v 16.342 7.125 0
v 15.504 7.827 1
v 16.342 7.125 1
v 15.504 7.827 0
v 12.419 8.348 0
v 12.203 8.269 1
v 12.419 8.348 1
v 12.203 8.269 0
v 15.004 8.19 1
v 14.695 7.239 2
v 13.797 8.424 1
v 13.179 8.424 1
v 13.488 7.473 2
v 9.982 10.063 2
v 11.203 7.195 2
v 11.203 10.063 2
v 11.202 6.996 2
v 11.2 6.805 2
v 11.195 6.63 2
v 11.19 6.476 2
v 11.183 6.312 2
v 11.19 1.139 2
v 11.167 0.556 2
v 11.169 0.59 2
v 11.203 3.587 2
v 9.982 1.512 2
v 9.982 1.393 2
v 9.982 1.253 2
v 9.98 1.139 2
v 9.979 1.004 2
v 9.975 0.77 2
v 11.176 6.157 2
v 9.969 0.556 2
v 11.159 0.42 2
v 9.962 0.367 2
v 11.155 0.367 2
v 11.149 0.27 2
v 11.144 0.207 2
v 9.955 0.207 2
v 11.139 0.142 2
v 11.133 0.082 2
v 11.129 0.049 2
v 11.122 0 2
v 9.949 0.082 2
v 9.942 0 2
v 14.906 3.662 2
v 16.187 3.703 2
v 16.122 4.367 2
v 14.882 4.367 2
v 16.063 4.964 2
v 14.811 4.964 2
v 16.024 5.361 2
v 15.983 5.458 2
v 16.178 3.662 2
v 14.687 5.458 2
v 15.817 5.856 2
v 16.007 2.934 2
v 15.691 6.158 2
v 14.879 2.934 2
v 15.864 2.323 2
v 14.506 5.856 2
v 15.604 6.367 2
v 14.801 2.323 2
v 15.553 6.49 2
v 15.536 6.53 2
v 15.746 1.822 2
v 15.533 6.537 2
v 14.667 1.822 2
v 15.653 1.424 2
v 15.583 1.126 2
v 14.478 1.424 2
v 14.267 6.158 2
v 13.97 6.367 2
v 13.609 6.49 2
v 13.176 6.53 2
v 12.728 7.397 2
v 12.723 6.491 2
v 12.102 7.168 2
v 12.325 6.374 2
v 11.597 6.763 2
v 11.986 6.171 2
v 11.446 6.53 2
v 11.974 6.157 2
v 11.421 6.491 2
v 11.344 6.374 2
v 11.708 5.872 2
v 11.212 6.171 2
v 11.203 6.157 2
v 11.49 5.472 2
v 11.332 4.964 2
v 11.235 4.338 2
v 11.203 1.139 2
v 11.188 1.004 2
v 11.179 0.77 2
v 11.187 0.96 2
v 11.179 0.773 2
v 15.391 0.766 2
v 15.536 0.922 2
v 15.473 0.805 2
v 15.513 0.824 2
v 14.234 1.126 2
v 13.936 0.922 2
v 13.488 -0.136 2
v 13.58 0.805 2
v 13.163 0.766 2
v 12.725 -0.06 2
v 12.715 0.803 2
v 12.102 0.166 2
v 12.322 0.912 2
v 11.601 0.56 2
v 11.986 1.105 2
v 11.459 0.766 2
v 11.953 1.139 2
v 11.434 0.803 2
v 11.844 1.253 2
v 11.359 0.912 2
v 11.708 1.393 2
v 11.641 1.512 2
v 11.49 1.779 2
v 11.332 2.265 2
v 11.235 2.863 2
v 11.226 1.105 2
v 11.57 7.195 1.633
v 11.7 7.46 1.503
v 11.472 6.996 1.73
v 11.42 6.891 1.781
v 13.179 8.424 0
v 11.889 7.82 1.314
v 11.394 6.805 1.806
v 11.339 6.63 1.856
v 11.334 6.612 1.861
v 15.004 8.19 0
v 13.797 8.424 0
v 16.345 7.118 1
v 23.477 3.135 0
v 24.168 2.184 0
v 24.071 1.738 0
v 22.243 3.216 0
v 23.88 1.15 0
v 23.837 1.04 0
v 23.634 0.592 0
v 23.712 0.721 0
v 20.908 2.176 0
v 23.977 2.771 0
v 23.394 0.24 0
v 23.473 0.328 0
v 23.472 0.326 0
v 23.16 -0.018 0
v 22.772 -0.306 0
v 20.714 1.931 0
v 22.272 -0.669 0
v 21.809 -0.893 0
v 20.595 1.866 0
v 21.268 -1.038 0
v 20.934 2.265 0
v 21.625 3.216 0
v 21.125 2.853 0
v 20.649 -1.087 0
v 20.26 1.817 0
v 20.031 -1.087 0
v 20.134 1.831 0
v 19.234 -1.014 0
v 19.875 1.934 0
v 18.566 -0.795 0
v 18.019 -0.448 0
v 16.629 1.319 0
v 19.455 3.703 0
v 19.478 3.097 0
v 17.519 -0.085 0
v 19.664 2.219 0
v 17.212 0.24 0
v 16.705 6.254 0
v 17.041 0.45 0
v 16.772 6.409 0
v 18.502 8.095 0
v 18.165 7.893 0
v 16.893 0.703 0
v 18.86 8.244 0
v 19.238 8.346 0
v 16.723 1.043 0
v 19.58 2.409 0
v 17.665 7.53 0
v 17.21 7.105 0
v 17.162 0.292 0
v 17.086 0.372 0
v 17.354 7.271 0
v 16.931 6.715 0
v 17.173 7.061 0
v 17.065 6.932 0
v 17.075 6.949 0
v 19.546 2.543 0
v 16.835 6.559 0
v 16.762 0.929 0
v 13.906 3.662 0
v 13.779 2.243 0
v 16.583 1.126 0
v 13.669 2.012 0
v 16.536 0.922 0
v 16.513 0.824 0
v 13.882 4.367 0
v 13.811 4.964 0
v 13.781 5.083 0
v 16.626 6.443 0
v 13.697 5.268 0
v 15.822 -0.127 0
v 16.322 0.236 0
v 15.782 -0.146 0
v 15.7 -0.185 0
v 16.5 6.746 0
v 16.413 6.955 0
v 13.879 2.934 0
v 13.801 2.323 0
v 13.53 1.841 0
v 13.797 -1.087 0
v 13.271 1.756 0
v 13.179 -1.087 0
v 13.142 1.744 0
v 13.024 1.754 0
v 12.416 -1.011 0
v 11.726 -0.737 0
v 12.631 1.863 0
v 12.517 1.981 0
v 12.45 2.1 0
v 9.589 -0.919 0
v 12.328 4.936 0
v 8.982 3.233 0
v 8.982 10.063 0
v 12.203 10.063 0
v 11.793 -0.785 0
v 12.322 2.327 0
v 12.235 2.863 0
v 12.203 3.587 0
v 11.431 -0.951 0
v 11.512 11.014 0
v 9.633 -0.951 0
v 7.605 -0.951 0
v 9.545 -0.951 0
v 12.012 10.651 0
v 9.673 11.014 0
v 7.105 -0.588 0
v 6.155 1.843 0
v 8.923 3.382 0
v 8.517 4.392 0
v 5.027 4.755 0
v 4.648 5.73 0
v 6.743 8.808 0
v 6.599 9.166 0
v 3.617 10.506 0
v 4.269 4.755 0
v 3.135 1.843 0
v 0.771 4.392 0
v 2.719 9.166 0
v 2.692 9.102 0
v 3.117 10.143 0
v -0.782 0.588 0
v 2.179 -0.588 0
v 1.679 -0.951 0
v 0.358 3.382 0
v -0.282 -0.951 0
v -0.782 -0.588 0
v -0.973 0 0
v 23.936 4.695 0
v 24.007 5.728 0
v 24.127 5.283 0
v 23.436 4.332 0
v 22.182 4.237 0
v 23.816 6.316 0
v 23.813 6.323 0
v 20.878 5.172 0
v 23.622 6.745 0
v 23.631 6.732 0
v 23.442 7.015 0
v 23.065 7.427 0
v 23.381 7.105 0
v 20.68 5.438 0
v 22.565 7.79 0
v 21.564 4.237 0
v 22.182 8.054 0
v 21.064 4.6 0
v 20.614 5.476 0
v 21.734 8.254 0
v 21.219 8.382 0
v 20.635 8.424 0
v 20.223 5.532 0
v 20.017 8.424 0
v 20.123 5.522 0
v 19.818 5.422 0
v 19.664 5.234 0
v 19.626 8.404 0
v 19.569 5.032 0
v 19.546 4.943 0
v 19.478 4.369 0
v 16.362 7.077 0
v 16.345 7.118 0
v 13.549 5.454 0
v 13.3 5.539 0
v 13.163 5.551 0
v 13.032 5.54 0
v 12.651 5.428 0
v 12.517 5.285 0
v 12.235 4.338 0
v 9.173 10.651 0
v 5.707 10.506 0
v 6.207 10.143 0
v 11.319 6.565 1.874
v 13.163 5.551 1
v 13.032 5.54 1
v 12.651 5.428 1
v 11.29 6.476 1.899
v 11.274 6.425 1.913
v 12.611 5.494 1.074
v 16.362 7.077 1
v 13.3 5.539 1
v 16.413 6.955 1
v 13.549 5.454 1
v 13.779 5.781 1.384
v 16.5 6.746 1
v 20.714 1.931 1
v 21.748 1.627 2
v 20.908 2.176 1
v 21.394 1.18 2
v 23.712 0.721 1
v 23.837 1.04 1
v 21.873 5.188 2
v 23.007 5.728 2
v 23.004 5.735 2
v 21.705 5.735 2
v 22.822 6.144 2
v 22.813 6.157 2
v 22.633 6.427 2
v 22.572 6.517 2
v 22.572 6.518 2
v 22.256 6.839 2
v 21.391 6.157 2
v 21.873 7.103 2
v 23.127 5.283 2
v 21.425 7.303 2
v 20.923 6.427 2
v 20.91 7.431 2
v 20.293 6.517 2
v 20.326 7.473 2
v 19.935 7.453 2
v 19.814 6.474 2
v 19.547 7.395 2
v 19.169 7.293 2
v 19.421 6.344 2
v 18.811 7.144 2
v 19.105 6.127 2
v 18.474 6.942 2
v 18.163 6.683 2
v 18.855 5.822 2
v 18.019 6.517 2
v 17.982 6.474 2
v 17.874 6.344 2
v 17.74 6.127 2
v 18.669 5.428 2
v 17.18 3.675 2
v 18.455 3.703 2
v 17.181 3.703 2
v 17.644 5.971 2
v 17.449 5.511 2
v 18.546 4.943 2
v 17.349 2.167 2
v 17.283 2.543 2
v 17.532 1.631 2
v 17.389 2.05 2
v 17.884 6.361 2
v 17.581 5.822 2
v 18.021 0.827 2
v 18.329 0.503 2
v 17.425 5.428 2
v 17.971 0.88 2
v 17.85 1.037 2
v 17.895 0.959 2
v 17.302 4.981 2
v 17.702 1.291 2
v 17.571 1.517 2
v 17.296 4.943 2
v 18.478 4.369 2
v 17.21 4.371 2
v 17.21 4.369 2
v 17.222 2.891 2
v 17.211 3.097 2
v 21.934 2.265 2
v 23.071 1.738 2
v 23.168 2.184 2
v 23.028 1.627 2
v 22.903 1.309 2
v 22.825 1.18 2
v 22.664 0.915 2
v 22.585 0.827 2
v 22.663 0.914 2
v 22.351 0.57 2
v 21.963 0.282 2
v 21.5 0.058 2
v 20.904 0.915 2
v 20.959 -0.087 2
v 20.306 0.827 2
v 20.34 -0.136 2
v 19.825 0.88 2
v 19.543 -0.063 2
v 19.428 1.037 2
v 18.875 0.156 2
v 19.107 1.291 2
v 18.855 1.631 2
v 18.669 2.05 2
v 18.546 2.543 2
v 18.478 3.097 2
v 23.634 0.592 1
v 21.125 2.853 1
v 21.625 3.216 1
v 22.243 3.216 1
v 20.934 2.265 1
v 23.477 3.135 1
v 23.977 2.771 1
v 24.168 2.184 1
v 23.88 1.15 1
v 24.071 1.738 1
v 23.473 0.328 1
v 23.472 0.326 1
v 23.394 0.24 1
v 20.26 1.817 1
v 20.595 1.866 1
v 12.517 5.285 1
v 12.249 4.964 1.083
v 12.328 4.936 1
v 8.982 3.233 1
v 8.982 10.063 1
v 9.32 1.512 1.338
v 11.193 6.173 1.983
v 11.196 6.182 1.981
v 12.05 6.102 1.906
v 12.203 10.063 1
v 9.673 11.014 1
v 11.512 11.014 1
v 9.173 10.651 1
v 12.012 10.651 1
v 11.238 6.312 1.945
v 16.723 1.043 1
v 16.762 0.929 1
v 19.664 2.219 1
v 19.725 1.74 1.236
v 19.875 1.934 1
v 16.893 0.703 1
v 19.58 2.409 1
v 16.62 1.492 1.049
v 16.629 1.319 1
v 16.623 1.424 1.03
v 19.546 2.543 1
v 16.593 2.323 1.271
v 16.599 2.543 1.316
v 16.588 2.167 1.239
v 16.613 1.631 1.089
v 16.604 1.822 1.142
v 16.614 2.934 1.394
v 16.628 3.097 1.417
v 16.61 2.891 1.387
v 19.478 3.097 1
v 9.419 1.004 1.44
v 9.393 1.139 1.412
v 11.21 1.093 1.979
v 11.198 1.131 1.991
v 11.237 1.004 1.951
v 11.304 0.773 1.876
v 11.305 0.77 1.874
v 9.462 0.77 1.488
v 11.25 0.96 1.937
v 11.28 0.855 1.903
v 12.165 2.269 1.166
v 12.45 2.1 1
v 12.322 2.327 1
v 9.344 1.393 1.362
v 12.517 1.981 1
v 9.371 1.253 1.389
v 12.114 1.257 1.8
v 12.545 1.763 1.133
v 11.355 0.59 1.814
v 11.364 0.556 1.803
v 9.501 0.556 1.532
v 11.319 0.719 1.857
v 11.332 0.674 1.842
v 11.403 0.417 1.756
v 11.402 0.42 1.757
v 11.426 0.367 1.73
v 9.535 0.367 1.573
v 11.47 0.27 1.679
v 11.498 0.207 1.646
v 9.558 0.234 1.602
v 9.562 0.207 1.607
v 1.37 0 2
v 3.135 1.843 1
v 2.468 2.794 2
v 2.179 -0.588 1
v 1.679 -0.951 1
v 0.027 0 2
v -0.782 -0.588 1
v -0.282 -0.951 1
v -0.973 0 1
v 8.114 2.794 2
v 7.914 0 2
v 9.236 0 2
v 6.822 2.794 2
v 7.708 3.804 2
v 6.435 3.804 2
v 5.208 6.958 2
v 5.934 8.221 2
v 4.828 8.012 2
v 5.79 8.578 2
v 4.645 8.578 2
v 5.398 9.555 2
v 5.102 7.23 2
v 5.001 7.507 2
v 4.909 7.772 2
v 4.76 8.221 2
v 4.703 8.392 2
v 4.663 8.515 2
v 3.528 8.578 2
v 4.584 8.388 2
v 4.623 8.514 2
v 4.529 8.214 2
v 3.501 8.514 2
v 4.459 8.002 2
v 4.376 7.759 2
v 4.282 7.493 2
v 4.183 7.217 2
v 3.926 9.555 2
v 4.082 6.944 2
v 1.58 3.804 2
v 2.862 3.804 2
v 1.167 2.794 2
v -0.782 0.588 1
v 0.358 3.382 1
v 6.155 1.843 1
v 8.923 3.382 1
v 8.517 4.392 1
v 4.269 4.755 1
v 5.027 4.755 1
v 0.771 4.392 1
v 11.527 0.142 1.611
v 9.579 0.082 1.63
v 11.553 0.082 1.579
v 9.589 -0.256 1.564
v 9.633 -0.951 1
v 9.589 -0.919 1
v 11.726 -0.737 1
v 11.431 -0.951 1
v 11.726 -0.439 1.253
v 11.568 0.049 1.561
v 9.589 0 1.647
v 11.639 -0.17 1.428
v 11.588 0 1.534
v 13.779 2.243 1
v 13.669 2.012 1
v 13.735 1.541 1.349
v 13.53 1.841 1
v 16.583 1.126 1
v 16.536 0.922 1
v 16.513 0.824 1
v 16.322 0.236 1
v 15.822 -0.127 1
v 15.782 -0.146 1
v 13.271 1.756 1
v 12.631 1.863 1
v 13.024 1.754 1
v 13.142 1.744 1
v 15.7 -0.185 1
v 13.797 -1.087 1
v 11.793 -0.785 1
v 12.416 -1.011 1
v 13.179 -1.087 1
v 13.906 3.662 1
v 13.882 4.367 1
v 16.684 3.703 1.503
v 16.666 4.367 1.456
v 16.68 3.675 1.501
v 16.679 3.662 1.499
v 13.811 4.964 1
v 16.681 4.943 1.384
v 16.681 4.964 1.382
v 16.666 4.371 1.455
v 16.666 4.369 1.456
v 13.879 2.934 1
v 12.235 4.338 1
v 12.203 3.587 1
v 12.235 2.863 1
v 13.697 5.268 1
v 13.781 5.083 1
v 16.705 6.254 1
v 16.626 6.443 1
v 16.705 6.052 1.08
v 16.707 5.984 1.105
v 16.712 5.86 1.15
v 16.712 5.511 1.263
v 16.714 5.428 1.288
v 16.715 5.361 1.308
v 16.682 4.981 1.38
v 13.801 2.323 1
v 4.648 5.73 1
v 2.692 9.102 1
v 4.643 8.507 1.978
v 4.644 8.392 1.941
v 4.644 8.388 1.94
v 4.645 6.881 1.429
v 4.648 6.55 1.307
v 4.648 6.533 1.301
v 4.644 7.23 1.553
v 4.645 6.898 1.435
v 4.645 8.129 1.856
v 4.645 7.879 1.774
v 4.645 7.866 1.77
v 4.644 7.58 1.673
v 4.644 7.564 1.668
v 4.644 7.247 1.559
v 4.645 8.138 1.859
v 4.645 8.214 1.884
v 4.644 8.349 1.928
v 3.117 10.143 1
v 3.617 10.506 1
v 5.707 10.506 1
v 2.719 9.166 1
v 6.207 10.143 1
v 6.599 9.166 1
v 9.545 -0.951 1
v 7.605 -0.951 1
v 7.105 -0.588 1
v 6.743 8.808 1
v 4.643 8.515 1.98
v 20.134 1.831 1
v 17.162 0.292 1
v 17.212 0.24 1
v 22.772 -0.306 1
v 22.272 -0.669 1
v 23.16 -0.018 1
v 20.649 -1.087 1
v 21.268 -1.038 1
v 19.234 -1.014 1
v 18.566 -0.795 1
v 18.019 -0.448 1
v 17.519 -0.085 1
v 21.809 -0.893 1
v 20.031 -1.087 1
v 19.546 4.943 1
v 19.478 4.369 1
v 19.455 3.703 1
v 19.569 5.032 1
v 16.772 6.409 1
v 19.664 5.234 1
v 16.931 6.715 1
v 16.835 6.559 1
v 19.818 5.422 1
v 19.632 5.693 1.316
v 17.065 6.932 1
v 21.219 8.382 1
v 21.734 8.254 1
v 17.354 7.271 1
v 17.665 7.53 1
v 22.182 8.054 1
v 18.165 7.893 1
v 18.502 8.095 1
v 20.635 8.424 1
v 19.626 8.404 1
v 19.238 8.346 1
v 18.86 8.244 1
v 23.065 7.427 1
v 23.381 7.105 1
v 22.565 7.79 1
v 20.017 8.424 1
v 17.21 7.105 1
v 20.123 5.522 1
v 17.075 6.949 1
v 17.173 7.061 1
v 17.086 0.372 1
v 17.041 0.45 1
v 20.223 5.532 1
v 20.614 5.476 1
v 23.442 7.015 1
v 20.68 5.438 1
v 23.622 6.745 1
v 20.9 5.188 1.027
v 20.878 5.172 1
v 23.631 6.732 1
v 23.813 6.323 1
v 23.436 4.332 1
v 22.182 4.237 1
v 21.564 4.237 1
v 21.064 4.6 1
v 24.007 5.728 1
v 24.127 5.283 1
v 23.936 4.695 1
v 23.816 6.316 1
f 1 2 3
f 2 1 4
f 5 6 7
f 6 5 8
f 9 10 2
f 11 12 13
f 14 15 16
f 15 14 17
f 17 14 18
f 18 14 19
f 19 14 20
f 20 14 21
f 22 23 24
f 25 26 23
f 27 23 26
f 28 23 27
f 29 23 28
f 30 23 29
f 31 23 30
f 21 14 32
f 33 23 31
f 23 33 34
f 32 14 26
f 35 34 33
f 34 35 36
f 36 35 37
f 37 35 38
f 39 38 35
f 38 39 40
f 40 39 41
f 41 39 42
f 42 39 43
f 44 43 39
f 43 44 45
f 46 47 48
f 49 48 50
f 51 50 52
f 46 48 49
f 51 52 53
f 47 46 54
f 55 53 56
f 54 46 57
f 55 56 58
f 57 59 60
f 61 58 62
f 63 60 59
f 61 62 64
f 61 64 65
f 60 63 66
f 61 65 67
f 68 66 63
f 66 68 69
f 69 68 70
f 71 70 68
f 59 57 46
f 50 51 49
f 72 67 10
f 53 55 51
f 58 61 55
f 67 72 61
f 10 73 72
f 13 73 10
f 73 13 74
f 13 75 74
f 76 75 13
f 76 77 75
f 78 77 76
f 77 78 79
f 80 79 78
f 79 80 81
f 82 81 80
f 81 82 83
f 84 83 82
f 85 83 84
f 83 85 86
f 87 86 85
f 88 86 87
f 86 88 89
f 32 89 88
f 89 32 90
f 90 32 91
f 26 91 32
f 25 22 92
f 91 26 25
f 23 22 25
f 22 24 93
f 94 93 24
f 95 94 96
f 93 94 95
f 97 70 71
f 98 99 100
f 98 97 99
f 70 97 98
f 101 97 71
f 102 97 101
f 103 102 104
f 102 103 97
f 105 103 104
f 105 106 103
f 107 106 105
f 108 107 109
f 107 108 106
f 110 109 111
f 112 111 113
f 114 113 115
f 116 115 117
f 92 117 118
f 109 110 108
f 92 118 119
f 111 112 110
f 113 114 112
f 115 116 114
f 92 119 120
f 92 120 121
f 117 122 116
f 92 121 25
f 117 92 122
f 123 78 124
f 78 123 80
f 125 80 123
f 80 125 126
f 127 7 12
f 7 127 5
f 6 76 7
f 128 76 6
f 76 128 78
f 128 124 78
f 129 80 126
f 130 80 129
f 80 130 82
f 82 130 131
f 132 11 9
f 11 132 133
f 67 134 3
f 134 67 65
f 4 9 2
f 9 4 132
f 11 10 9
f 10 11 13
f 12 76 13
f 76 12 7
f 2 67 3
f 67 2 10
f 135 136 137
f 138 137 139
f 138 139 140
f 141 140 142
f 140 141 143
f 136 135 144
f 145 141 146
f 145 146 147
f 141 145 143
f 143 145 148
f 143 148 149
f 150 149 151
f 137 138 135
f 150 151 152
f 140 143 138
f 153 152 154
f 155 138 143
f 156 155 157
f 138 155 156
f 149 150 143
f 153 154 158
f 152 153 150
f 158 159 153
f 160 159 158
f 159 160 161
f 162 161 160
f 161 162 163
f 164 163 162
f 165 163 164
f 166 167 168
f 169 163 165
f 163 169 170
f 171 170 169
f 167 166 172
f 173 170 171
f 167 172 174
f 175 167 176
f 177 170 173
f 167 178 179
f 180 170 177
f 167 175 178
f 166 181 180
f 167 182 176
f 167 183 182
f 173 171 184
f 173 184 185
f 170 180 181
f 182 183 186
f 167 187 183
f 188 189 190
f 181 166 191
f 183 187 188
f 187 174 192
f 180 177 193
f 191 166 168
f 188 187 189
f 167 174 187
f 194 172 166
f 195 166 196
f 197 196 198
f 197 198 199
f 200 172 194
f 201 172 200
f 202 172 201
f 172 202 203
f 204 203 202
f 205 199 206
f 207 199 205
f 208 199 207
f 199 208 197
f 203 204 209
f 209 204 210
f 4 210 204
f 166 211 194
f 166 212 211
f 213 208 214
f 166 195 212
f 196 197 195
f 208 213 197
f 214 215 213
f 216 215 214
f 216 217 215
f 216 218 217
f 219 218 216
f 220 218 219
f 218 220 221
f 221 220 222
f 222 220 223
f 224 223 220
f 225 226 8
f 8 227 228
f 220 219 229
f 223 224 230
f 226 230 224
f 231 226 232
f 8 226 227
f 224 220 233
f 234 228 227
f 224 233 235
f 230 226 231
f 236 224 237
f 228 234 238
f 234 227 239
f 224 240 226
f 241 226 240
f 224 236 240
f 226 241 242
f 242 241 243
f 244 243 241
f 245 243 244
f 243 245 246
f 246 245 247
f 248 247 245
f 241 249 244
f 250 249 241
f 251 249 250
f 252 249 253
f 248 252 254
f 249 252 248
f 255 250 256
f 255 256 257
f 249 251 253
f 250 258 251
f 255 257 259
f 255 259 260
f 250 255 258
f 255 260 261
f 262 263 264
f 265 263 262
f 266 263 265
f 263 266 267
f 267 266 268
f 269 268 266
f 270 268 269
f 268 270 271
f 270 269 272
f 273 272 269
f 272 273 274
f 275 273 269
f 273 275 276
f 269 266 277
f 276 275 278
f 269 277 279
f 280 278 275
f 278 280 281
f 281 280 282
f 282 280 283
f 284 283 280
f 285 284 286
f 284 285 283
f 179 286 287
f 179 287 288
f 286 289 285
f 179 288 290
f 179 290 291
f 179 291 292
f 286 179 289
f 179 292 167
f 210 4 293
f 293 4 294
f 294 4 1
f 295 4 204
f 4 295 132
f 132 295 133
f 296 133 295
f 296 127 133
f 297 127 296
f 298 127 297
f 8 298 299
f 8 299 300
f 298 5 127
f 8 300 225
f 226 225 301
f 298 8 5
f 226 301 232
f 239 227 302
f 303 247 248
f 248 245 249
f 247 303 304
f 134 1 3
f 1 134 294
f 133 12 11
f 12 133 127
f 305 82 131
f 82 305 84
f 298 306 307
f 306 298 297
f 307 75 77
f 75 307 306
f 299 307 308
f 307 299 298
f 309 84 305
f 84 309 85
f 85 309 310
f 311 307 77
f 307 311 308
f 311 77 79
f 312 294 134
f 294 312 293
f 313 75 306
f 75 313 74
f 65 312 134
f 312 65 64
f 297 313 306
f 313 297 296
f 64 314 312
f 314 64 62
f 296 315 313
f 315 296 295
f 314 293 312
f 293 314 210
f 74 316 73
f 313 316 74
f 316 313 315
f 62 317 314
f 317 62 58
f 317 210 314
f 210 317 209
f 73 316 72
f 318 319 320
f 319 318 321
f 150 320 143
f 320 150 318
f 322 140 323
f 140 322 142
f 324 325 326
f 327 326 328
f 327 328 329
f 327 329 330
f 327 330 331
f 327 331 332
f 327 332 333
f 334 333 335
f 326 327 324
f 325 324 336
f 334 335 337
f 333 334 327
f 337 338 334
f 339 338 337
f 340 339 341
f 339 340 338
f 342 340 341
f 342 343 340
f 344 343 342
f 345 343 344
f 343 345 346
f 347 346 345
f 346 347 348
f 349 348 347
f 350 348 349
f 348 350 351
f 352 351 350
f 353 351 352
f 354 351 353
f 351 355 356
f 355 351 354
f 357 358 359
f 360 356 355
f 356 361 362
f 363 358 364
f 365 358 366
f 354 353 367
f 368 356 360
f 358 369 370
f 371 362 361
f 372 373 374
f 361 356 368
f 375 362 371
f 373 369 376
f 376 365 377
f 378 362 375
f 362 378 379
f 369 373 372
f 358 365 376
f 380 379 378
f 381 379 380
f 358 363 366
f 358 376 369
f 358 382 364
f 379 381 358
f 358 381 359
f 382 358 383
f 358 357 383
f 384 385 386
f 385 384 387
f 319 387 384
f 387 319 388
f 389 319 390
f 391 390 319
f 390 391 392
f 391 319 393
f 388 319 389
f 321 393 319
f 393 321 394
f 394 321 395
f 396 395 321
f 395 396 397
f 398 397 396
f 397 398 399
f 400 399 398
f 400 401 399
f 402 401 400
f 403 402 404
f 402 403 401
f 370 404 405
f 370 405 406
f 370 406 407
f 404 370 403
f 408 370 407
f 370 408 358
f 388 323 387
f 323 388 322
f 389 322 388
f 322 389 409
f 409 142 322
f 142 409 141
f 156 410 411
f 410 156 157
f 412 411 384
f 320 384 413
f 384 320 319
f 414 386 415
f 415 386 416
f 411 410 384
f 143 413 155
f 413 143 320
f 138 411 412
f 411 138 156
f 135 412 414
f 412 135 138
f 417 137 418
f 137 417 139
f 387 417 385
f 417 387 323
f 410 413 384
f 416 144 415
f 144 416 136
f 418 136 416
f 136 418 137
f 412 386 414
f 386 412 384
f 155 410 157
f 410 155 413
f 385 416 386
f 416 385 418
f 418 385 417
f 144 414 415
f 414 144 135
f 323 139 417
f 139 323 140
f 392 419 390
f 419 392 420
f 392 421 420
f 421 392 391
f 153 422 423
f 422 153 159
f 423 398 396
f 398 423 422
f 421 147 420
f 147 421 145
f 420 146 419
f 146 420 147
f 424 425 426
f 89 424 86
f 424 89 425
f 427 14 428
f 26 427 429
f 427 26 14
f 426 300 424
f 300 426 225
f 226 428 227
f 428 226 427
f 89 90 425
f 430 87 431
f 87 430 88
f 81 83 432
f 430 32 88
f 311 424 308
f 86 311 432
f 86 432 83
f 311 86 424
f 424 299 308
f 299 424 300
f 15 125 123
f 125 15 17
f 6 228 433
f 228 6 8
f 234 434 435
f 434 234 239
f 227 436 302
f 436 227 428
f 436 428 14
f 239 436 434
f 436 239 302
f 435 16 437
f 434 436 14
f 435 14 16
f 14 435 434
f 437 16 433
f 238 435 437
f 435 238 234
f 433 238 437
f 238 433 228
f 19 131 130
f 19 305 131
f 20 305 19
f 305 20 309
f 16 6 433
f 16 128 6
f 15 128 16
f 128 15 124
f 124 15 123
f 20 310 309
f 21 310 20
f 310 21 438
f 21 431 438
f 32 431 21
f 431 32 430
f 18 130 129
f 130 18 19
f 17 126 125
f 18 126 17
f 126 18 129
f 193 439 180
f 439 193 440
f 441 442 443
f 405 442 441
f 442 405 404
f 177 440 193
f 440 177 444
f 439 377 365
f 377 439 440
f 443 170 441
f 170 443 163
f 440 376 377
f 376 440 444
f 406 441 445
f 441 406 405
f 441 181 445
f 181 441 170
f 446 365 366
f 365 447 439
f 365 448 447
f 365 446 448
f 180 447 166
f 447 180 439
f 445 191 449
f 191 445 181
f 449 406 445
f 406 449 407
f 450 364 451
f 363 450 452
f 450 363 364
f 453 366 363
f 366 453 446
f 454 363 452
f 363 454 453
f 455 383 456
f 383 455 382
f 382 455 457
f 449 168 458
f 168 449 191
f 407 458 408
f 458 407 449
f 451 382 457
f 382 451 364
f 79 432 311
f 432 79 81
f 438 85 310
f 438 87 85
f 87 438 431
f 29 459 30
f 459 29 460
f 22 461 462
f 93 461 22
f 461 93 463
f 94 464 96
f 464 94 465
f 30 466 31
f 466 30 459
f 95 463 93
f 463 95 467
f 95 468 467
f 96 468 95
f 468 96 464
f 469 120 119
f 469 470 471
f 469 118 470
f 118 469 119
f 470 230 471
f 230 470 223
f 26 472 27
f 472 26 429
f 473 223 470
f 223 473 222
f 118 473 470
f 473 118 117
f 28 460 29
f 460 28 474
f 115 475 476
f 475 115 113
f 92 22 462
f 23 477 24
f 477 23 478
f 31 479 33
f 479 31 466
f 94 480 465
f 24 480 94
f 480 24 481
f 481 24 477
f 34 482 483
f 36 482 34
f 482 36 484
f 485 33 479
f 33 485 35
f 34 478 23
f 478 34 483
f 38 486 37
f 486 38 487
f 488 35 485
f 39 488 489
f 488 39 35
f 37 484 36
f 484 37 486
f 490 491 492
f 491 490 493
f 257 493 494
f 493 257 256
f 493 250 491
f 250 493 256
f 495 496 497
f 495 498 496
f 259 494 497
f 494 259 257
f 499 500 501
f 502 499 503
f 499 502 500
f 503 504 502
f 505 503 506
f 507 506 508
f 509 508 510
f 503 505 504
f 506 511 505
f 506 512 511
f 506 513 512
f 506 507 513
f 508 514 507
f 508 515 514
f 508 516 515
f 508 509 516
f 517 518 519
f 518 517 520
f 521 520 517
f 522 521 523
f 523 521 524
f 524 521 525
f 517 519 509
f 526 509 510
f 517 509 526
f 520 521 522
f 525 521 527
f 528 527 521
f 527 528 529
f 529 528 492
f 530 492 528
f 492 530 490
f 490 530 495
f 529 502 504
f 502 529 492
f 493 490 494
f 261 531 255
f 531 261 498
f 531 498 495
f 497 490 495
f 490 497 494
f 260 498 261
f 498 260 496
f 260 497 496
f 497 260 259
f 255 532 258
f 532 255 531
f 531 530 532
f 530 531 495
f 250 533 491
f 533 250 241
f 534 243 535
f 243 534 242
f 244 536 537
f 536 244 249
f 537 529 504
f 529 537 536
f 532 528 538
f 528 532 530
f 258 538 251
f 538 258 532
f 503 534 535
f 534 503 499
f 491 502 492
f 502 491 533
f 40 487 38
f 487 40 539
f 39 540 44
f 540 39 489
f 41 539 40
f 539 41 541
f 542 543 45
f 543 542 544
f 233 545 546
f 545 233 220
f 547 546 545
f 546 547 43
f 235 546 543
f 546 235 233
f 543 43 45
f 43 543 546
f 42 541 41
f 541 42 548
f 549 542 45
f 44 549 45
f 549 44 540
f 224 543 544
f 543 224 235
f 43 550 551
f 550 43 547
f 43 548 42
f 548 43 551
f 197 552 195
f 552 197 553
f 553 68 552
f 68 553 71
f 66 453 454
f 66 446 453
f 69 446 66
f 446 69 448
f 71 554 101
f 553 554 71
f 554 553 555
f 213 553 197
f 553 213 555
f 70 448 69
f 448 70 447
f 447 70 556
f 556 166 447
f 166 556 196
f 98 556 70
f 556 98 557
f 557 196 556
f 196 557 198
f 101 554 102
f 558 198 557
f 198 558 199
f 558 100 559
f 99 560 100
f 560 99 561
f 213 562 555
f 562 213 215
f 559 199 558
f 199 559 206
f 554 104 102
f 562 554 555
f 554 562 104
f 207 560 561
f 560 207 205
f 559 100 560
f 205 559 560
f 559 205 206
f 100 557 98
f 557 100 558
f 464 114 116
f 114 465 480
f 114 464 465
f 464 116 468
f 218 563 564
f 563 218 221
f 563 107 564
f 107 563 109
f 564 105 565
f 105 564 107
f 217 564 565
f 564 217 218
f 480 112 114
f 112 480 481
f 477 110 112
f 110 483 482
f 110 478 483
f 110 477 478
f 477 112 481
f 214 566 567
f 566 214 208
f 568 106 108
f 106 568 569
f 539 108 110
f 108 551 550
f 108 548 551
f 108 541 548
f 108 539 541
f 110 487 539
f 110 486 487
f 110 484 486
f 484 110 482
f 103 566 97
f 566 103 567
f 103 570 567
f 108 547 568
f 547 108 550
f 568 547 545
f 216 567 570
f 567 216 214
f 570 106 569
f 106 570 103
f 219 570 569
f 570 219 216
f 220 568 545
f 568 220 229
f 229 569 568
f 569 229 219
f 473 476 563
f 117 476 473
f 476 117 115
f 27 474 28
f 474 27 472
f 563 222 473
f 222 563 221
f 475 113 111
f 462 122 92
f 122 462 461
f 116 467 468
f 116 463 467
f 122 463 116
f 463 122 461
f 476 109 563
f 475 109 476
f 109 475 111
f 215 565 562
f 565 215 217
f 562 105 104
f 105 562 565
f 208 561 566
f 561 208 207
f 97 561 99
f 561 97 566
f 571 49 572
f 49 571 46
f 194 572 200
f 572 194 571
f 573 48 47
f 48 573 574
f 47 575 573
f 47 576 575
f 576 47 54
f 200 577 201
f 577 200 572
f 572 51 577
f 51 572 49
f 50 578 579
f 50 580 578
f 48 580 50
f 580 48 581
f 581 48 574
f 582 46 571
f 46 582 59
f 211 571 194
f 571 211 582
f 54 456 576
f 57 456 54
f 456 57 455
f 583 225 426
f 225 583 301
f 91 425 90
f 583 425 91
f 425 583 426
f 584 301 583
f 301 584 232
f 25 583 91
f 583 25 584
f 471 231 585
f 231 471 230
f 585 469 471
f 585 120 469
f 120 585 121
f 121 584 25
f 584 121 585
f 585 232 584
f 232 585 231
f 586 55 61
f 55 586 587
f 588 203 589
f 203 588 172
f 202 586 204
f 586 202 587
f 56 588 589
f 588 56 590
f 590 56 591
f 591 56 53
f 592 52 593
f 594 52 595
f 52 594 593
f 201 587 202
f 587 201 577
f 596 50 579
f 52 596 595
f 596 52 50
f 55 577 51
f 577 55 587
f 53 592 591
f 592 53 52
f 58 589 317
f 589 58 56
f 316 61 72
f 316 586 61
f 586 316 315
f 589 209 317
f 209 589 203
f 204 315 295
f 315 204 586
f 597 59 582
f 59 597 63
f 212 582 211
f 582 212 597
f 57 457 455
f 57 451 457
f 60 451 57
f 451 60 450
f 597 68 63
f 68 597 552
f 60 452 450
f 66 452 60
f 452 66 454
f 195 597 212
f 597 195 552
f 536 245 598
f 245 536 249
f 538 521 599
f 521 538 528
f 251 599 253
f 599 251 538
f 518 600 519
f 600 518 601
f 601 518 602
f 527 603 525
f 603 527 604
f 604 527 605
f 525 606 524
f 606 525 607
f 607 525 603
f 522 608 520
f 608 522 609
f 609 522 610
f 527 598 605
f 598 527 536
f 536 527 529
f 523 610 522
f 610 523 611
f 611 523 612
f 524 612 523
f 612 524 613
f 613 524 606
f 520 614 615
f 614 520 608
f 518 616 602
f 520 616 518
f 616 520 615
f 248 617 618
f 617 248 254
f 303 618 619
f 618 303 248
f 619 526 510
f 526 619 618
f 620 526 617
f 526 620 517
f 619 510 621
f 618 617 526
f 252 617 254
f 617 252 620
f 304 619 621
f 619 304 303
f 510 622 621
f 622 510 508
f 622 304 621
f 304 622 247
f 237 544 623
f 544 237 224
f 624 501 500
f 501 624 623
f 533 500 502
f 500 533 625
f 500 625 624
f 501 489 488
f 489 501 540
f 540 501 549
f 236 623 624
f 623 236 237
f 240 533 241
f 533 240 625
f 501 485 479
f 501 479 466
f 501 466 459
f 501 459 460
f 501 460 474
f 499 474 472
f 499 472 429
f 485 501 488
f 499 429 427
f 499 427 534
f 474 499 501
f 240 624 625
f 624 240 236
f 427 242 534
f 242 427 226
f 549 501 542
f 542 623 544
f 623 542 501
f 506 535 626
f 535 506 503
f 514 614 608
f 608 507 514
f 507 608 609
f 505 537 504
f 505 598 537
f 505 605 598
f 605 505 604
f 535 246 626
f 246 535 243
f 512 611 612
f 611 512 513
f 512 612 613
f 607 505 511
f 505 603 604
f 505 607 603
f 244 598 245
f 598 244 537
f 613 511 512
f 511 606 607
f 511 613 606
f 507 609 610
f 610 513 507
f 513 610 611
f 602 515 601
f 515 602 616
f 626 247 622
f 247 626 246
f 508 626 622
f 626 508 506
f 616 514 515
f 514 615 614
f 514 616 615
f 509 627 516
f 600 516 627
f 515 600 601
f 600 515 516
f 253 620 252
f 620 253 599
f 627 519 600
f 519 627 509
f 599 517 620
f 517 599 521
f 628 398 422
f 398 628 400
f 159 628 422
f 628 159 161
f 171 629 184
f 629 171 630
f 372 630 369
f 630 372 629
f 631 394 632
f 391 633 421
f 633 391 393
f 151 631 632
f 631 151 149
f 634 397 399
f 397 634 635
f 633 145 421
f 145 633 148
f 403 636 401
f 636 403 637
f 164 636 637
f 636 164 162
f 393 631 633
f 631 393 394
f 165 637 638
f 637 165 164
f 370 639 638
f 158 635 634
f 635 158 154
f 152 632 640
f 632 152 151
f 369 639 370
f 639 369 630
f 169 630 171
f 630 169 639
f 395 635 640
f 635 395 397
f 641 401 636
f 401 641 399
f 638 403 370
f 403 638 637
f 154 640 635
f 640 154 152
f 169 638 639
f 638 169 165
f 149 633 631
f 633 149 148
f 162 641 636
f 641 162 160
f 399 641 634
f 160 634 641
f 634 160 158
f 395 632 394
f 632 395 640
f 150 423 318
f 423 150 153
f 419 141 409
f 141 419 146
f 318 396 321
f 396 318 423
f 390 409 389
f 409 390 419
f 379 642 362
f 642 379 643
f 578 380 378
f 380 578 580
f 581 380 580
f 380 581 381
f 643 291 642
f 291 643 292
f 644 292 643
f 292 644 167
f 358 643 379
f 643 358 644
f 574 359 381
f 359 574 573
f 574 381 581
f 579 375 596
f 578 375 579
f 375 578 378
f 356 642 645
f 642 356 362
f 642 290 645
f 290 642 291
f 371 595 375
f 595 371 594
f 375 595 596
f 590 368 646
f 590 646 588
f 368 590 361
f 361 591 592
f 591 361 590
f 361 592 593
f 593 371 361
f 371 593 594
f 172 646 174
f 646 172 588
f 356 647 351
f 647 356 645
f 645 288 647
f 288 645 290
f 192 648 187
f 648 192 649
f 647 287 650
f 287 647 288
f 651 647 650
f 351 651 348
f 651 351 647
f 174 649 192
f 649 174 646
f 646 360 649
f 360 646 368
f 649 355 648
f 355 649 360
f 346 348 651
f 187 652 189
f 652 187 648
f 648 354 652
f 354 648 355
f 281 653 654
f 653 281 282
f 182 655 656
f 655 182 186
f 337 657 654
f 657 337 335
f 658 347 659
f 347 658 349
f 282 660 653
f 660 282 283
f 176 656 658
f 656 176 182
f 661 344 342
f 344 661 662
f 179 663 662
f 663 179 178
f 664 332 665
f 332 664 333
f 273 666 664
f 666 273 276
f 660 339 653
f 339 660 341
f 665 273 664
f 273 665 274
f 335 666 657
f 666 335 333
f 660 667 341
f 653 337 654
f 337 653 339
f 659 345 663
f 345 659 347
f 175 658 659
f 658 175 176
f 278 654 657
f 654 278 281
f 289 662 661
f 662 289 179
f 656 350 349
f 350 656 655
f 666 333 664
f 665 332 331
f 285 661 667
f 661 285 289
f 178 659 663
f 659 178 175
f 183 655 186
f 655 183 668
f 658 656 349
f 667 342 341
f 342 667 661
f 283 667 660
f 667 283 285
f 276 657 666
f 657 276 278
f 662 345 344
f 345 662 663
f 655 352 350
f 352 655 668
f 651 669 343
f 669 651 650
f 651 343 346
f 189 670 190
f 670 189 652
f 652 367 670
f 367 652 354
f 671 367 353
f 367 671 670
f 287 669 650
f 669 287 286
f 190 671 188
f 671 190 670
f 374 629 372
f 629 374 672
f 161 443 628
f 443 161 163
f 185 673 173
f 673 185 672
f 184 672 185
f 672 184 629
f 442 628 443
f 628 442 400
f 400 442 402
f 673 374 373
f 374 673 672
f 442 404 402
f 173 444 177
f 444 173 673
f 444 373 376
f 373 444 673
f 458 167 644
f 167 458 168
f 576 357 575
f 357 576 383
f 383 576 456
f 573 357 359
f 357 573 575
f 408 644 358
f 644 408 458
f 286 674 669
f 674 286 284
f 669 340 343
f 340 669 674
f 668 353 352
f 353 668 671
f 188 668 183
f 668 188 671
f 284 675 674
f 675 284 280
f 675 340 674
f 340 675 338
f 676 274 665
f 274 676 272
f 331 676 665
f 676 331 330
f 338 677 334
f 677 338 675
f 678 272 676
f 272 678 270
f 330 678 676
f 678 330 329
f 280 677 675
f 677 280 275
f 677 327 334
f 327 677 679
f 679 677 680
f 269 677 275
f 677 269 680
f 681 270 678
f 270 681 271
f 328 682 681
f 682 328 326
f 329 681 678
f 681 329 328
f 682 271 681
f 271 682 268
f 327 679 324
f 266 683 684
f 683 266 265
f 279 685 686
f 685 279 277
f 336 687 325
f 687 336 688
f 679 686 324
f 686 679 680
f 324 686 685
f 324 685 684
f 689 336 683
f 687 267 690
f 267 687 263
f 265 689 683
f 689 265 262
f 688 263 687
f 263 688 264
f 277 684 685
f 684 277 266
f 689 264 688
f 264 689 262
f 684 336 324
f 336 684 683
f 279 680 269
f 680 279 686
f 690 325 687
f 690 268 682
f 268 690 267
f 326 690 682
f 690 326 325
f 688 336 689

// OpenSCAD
minkowski() {
    
    linear_extrude(1)
        text("Abc", $fn=5);
     cylinder(d1=2, d2=0, $fn=10);
}
